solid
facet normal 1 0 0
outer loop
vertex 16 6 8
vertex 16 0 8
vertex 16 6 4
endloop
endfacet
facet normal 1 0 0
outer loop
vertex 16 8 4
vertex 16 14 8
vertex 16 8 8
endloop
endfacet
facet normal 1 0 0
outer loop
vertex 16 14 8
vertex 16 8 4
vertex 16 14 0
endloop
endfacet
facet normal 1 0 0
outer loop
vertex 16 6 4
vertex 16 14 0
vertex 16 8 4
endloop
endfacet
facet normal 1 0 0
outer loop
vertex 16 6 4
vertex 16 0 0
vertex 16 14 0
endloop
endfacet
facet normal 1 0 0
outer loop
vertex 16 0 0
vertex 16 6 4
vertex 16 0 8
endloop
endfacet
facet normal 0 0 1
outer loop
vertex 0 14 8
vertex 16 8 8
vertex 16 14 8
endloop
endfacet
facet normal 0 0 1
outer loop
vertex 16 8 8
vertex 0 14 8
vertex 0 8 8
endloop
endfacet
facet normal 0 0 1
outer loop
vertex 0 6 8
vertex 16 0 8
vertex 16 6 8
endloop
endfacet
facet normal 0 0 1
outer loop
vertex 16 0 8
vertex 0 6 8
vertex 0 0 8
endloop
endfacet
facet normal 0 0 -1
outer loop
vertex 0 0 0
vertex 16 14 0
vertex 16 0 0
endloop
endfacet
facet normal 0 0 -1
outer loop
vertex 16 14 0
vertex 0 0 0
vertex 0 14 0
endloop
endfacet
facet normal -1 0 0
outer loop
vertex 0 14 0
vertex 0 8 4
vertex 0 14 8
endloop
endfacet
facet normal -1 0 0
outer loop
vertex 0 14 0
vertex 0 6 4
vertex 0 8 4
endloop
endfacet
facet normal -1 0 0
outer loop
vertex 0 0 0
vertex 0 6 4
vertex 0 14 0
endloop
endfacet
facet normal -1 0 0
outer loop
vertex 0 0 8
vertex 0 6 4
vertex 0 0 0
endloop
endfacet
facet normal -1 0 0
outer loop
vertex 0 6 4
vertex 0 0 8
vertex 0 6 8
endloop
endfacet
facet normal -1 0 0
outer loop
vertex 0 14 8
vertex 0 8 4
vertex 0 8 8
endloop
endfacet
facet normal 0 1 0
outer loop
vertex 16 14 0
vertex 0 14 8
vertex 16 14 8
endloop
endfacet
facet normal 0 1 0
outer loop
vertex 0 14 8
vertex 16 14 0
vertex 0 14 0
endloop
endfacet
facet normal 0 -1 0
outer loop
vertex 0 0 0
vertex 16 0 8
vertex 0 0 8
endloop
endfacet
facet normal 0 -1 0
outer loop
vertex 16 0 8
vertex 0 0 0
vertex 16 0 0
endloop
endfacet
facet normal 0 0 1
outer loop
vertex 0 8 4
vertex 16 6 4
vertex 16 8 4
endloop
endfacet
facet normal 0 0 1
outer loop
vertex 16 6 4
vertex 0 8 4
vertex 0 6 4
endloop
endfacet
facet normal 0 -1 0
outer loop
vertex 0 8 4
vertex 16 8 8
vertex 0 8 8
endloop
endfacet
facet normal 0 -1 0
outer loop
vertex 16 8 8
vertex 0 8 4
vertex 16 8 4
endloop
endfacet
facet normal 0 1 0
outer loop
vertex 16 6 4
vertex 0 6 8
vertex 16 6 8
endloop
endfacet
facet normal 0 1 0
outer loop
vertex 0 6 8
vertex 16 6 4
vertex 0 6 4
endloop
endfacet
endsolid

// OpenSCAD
$fn = 32;

// ----------------------------------------------------------------------
// Micro clip: slotted block, 5-20 mm class
// ----------------------------------------------------------------------

// --- parameters (mm) ---
block_l = 16;             // block length, X
block_w = 14;             // block width, Y
block_h = 8;              // block height, Z
slot_w = 2;               // slot width
slot_d = 4;               // slot depth from the top
fit_tol = 0.02;           // tolerance for press fits, mm
free_tol = 0.2;           // tolerance for clearance fits, mm

difference() {
  cube([block_l, block_w, block_h]);
  translate([-1, block_w / 2 - slot_w / 2, block_h - slot_d])
    cube([block_l + 2, slot_w, slot_d + 1]);
}
